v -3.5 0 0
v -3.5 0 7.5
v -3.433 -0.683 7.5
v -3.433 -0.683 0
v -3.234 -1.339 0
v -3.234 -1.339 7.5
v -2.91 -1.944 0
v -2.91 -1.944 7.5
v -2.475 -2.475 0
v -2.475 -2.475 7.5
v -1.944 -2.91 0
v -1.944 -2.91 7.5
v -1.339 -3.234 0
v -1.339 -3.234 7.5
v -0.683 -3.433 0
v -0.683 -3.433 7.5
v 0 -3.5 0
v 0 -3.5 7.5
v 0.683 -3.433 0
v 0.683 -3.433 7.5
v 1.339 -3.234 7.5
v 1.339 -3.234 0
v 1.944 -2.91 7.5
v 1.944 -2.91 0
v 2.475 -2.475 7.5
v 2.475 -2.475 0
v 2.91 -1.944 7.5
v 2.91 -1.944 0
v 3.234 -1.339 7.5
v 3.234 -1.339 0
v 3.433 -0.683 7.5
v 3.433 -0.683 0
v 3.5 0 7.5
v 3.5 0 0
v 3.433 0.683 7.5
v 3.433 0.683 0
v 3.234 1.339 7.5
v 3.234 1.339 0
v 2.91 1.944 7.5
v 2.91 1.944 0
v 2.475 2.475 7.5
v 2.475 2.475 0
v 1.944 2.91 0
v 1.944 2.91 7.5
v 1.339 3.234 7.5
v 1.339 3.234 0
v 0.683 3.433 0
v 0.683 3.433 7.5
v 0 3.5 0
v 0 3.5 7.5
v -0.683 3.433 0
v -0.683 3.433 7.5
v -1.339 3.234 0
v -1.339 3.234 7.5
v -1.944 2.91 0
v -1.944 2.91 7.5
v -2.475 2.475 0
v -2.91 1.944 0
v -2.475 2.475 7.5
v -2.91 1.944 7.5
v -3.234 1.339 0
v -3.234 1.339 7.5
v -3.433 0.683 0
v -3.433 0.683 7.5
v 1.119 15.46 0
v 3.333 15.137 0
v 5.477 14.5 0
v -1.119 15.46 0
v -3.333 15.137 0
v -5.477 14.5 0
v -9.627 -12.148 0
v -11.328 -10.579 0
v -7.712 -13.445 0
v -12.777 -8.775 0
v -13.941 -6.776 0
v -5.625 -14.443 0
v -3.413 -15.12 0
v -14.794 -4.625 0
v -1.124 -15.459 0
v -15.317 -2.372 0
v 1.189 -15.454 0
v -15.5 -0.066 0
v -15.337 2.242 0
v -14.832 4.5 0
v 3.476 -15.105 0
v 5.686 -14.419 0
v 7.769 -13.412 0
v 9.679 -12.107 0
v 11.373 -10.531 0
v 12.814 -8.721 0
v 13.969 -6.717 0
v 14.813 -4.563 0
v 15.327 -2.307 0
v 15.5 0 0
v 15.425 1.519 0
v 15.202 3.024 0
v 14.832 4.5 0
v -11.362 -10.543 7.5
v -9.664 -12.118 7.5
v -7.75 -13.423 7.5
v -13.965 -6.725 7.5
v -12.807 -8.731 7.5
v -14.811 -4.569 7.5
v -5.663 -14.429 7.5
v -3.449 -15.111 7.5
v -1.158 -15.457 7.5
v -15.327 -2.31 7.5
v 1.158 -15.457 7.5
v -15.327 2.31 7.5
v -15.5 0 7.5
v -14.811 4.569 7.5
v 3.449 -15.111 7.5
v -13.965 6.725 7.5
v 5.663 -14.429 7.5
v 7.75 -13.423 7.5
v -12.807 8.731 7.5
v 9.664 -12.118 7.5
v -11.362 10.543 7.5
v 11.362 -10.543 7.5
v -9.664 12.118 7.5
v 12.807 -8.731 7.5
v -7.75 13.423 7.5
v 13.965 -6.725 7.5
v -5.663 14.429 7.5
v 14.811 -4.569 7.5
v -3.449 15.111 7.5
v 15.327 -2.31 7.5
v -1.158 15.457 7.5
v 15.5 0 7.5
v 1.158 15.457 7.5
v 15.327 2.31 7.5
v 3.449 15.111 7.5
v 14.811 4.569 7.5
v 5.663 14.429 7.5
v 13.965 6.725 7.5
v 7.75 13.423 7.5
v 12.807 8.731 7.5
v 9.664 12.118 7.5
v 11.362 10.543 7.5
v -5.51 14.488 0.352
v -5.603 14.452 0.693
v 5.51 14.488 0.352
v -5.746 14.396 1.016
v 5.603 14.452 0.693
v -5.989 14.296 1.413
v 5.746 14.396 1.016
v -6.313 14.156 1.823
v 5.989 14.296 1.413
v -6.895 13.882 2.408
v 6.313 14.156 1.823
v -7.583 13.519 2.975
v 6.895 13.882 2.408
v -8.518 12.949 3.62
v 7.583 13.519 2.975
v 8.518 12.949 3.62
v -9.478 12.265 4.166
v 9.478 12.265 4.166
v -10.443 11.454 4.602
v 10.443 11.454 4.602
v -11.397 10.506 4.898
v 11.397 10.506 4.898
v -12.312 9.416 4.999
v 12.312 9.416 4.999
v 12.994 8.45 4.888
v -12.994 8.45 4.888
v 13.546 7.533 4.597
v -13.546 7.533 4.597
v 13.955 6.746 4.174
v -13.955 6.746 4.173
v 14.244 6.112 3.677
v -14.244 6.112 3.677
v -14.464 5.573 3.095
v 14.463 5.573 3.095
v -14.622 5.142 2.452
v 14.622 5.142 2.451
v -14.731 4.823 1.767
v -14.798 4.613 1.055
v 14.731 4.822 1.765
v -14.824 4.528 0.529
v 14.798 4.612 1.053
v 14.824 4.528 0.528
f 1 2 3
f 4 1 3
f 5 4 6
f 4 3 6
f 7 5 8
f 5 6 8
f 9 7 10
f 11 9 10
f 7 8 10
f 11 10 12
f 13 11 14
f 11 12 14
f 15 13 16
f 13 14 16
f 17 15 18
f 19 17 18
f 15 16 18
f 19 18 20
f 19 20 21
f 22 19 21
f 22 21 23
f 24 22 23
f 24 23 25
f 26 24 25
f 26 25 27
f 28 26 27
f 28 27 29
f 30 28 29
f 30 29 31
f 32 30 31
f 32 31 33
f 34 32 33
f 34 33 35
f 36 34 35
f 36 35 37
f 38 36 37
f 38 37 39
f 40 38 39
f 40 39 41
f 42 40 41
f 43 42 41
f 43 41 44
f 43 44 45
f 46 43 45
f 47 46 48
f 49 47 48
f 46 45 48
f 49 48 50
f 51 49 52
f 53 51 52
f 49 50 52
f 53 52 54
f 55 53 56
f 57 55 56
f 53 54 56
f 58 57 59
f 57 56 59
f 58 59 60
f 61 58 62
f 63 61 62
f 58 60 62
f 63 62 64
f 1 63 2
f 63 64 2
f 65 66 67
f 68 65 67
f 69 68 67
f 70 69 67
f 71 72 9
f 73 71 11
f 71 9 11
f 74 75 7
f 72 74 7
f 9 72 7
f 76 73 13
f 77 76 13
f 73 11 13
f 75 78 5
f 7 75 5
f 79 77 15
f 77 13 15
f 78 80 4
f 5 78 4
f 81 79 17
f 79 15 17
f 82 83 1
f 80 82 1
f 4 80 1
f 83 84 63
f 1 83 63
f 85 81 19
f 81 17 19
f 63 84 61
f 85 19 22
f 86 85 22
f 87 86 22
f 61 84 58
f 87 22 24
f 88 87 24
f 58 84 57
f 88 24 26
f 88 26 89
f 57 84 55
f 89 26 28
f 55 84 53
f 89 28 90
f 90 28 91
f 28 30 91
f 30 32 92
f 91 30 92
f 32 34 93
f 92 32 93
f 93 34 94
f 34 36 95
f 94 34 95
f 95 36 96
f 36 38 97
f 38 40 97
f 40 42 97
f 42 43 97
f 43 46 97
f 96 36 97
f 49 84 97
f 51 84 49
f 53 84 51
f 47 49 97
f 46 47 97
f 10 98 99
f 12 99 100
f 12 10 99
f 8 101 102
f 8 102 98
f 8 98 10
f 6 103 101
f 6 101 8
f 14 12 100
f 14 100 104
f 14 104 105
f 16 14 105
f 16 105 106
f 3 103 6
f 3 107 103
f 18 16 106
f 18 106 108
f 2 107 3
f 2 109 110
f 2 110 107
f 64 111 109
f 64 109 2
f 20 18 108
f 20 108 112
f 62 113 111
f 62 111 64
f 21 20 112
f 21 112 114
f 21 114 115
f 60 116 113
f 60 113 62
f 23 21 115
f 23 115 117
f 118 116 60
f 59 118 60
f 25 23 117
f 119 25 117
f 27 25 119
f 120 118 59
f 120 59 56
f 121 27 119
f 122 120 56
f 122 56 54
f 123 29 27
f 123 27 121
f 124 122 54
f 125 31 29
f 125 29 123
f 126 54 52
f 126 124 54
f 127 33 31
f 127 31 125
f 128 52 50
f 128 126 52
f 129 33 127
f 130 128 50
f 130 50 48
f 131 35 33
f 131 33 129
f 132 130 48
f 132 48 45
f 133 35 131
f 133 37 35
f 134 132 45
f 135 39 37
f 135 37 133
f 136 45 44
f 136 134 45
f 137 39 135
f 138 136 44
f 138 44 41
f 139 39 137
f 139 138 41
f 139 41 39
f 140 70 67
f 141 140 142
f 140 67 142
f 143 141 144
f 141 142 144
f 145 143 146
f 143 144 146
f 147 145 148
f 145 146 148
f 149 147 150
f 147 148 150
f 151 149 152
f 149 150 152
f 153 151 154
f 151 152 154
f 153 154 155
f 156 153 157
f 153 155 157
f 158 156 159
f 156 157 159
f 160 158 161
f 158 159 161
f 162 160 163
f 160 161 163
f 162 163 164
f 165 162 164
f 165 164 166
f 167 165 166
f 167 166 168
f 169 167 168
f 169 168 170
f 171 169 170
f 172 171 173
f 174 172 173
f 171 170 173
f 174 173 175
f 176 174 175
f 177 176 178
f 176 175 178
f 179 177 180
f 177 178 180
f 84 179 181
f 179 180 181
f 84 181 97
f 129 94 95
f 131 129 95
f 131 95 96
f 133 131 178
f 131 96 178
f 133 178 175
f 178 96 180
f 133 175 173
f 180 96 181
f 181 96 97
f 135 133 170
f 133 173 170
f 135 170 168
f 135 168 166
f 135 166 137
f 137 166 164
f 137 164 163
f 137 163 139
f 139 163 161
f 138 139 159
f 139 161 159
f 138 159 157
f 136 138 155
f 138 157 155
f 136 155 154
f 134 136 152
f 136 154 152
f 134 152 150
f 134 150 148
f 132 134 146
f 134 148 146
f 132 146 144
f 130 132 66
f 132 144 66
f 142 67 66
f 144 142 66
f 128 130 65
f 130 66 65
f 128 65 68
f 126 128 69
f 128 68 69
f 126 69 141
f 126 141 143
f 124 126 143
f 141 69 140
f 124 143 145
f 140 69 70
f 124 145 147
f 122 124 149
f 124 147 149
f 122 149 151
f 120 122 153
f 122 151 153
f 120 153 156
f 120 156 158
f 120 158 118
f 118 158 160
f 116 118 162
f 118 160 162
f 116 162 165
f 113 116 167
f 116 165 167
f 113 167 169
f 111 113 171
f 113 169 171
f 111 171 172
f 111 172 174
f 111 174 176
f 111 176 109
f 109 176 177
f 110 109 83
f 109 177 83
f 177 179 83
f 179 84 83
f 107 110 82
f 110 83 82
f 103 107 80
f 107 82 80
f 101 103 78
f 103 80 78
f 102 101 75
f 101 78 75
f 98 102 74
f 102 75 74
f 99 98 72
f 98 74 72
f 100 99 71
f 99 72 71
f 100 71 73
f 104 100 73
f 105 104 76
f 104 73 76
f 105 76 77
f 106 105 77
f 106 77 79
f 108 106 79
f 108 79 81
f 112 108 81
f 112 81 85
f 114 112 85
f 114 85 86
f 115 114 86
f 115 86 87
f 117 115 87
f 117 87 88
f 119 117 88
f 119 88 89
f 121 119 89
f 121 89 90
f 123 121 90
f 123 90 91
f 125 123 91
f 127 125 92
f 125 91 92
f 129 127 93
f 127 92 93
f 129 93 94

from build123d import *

# Parameters (mm, degrees)
F0_R     = 15.5
F2_DEPTH = 7.5
F3_R     = 5
F4_DEPTH = 20
F5_D     = 7


with BuildPart() as f2:
    # F0 (on Top) → F2 (new body)
    with BuildSketch(Plane.XY):
        Circle(F0_R)
    extrude(amount=F2_DEPTH)

    # F3 (on Right) → F4 (cut, symmetric)
    with BuildSketch(Plane.YZ):
        with Locations((9.5, 0)):
            Circle(F3_R)
    extrude(amount=F4_DEPTH, both=True, mode=Mode.SUBTRACT)

    # F5 (through all)
    with Locations(Plane(origin=(0, 0, 0), x_dir=(1, 0, 0), z_dir=(0, 0, -1))):
        with Locations((0, 0)):
            Hole(F5_D / 2)


solid = f2.part
